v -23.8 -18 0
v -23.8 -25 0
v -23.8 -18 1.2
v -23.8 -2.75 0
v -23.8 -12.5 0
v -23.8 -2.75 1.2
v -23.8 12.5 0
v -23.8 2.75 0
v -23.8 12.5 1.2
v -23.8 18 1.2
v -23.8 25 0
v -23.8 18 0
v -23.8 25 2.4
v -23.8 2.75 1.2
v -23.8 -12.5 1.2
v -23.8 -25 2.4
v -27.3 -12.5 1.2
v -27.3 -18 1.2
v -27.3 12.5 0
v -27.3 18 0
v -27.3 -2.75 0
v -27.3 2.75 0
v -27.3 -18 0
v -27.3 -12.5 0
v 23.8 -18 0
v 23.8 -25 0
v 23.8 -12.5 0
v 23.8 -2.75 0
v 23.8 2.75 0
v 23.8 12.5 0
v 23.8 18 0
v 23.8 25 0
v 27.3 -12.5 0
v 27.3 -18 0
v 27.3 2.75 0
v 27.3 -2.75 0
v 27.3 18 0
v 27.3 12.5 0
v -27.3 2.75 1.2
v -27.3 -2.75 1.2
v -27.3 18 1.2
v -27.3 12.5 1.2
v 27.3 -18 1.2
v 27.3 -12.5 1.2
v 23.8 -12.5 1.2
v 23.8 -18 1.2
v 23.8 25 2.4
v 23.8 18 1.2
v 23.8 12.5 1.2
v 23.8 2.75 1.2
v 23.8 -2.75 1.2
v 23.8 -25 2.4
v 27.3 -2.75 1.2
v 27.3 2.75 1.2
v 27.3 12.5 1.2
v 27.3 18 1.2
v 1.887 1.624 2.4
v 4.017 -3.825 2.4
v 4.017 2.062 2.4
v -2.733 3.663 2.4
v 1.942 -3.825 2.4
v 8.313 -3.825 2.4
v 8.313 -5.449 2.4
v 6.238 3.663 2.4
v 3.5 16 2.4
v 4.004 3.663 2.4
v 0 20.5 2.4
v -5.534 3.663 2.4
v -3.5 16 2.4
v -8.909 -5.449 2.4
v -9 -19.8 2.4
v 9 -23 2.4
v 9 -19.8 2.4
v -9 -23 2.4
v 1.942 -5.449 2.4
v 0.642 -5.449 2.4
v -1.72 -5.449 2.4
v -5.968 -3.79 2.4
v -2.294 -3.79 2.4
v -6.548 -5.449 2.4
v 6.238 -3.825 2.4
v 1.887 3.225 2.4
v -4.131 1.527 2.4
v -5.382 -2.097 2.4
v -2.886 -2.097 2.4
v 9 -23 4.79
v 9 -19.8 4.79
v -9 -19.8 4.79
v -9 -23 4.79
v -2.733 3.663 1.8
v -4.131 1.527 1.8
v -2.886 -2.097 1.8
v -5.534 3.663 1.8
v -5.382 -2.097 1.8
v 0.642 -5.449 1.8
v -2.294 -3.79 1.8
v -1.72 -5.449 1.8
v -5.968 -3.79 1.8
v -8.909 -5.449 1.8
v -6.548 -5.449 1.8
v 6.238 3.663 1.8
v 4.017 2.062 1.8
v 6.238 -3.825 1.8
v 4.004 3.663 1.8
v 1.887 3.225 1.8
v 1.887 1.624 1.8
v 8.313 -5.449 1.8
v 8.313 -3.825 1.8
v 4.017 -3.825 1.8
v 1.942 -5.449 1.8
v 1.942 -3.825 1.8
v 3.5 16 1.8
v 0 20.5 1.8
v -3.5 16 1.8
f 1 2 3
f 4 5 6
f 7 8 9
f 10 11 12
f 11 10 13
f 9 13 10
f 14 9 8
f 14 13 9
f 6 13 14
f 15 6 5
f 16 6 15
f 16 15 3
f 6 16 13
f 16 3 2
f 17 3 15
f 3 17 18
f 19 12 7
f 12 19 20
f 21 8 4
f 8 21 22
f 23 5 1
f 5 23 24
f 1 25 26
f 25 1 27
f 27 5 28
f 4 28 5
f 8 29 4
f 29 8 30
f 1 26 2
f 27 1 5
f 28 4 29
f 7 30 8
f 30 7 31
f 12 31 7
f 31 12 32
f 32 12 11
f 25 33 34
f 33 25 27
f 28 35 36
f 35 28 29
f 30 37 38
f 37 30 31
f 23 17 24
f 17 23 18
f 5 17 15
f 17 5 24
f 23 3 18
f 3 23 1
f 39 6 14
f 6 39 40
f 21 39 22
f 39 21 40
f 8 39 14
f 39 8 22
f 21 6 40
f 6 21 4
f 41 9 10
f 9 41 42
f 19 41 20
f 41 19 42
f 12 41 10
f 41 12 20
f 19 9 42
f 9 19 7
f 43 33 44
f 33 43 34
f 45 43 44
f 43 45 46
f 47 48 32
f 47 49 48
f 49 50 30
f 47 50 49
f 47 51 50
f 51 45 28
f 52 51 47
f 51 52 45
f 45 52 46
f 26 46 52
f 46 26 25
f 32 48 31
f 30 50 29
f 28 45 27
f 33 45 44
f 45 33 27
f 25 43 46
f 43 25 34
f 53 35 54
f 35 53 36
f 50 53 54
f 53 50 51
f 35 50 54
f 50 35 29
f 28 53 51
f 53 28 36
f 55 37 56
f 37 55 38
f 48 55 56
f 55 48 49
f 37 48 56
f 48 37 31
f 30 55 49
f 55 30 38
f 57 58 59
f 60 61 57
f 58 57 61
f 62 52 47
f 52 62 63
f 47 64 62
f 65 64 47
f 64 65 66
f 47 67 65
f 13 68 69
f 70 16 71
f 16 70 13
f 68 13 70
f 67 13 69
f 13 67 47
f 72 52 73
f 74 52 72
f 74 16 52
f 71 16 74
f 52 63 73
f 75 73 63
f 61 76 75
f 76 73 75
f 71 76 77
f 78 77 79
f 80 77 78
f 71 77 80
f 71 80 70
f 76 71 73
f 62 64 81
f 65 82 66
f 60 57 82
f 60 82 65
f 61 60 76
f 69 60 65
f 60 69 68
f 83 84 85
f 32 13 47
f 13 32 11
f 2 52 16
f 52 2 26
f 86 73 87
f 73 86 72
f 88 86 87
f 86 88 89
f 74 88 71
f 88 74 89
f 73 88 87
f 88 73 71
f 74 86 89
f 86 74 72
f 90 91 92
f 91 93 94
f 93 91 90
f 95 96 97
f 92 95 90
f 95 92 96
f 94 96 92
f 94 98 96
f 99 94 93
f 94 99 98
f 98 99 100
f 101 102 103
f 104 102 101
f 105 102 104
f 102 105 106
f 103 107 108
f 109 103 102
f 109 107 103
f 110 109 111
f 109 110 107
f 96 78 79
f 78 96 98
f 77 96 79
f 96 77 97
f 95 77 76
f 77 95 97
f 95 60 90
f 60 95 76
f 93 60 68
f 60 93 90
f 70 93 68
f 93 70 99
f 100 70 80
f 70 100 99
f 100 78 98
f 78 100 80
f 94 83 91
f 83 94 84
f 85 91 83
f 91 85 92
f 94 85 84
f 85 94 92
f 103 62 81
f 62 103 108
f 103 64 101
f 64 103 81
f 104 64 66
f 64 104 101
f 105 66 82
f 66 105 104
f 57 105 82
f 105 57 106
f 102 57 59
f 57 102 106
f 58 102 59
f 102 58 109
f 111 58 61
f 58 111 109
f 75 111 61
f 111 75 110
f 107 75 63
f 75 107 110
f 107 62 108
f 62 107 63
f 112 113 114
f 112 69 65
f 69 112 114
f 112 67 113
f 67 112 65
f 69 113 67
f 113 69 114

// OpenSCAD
// Single spare shutter door (prints loose; drop in at the open position
// and slide forward to lock).
include <sushi-battleship.scad>
part = "door";
